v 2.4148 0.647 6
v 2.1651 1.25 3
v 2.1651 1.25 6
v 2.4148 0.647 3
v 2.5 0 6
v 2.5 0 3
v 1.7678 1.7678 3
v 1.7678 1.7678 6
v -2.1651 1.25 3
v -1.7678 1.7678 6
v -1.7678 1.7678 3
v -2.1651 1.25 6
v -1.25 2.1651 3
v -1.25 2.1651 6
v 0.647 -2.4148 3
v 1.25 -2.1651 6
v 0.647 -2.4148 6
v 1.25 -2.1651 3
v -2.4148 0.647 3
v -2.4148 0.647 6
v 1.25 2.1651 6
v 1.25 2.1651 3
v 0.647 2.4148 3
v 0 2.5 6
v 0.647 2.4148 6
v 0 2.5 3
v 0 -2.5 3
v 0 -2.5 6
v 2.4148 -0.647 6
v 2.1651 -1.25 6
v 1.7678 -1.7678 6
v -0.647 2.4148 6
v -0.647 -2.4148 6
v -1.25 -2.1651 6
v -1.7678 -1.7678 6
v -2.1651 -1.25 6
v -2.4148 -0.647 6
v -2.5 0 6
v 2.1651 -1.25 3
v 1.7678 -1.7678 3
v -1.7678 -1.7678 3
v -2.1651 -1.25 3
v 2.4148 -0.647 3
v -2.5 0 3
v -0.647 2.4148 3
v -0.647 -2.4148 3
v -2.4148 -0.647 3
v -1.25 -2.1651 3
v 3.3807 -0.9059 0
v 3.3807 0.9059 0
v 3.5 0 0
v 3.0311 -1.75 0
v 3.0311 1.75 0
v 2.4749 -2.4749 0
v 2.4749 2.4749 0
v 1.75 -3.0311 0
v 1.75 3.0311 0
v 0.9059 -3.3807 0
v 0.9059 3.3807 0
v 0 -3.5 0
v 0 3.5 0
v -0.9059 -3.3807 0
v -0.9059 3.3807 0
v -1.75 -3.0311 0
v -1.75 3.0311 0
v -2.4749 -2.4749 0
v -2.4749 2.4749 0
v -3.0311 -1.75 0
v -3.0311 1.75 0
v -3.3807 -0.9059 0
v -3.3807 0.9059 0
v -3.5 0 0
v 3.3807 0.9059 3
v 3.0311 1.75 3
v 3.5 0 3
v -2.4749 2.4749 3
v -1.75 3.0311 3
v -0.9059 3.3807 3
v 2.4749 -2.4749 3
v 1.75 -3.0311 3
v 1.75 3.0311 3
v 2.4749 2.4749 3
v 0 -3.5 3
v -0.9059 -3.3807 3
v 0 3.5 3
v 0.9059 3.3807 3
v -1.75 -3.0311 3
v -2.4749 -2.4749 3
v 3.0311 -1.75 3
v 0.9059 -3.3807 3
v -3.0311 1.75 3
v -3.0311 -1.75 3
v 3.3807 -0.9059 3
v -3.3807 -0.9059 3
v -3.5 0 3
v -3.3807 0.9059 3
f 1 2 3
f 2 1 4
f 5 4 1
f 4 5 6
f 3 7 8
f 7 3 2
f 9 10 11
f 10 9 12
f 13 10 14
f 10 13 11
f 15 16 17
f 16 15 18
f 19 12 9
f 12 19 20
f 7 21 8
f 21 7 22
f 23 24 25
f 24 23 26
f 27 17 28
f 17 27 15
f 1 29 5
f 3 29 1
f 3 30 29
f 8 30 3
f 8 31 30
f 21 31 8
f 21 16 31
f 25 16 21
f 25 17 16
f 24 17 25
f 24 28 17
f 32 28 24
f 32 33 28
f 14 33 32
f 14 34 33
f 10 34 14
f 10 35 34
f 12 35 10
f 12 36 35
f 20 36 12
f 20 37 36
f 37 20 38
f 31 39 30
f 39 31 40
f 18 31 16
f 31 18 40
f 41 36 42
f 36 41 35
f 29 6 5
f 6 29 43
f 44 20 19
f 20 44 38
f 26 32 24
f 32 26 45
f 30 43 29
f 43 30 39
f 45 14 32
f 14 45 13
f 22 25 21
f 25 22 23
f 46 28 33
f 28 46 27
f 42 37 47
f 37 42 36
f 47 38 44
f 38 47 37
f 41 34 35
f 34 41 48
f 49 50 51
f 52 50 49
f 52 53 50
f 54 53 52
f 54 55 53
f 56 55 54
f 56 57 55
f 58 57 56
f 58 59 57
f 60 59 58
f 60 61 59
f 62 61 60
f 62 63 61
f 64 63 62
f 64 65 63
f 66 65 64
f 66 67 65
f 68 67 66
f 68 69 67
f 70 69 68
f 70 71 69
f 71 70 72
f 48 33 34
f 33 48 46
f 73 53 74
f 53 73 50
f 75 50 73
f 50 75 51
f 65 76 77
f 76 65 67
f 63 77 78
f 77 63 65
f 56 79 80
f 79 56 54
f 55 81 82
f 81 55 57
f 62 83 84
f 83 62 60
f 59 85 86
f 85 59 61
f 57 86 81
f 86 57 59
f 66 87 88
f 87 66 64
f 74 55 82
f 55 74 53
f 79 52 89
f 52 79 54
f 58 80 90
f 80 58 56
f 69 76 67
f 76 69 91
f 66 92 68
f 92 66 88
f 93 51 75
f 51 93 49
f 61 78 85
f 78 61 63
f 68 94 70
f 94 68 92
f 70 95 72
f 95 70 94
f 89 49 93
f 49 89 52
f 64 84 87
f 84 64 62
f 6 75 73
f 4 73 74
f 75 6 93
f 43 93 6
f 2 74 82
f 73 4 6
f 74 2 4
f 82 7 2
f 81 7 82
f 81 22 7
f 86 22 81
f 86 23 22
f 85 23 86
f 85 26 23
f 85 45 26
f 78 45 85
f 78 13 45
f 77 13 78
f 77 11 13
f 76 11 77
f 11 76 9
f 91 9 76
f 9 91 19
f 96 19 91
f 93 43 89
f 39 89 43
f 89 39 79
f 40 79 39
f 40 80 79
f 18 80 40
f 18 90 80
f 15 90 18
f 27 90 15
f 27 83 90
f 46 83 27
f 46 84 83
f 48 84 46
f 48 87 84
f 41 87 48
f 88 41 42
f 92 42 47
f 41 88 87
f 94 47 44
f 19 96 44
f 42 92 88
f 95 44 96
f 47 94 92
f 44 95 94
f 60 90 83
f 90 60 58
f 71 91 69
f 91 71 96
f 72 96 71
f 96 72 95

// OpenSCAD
union() {
	cylinder($fn = 24, h = 6, r = 2.5000000000);
	cylinder($fn = 24, h = 3, r = 3.5000000000);
}
